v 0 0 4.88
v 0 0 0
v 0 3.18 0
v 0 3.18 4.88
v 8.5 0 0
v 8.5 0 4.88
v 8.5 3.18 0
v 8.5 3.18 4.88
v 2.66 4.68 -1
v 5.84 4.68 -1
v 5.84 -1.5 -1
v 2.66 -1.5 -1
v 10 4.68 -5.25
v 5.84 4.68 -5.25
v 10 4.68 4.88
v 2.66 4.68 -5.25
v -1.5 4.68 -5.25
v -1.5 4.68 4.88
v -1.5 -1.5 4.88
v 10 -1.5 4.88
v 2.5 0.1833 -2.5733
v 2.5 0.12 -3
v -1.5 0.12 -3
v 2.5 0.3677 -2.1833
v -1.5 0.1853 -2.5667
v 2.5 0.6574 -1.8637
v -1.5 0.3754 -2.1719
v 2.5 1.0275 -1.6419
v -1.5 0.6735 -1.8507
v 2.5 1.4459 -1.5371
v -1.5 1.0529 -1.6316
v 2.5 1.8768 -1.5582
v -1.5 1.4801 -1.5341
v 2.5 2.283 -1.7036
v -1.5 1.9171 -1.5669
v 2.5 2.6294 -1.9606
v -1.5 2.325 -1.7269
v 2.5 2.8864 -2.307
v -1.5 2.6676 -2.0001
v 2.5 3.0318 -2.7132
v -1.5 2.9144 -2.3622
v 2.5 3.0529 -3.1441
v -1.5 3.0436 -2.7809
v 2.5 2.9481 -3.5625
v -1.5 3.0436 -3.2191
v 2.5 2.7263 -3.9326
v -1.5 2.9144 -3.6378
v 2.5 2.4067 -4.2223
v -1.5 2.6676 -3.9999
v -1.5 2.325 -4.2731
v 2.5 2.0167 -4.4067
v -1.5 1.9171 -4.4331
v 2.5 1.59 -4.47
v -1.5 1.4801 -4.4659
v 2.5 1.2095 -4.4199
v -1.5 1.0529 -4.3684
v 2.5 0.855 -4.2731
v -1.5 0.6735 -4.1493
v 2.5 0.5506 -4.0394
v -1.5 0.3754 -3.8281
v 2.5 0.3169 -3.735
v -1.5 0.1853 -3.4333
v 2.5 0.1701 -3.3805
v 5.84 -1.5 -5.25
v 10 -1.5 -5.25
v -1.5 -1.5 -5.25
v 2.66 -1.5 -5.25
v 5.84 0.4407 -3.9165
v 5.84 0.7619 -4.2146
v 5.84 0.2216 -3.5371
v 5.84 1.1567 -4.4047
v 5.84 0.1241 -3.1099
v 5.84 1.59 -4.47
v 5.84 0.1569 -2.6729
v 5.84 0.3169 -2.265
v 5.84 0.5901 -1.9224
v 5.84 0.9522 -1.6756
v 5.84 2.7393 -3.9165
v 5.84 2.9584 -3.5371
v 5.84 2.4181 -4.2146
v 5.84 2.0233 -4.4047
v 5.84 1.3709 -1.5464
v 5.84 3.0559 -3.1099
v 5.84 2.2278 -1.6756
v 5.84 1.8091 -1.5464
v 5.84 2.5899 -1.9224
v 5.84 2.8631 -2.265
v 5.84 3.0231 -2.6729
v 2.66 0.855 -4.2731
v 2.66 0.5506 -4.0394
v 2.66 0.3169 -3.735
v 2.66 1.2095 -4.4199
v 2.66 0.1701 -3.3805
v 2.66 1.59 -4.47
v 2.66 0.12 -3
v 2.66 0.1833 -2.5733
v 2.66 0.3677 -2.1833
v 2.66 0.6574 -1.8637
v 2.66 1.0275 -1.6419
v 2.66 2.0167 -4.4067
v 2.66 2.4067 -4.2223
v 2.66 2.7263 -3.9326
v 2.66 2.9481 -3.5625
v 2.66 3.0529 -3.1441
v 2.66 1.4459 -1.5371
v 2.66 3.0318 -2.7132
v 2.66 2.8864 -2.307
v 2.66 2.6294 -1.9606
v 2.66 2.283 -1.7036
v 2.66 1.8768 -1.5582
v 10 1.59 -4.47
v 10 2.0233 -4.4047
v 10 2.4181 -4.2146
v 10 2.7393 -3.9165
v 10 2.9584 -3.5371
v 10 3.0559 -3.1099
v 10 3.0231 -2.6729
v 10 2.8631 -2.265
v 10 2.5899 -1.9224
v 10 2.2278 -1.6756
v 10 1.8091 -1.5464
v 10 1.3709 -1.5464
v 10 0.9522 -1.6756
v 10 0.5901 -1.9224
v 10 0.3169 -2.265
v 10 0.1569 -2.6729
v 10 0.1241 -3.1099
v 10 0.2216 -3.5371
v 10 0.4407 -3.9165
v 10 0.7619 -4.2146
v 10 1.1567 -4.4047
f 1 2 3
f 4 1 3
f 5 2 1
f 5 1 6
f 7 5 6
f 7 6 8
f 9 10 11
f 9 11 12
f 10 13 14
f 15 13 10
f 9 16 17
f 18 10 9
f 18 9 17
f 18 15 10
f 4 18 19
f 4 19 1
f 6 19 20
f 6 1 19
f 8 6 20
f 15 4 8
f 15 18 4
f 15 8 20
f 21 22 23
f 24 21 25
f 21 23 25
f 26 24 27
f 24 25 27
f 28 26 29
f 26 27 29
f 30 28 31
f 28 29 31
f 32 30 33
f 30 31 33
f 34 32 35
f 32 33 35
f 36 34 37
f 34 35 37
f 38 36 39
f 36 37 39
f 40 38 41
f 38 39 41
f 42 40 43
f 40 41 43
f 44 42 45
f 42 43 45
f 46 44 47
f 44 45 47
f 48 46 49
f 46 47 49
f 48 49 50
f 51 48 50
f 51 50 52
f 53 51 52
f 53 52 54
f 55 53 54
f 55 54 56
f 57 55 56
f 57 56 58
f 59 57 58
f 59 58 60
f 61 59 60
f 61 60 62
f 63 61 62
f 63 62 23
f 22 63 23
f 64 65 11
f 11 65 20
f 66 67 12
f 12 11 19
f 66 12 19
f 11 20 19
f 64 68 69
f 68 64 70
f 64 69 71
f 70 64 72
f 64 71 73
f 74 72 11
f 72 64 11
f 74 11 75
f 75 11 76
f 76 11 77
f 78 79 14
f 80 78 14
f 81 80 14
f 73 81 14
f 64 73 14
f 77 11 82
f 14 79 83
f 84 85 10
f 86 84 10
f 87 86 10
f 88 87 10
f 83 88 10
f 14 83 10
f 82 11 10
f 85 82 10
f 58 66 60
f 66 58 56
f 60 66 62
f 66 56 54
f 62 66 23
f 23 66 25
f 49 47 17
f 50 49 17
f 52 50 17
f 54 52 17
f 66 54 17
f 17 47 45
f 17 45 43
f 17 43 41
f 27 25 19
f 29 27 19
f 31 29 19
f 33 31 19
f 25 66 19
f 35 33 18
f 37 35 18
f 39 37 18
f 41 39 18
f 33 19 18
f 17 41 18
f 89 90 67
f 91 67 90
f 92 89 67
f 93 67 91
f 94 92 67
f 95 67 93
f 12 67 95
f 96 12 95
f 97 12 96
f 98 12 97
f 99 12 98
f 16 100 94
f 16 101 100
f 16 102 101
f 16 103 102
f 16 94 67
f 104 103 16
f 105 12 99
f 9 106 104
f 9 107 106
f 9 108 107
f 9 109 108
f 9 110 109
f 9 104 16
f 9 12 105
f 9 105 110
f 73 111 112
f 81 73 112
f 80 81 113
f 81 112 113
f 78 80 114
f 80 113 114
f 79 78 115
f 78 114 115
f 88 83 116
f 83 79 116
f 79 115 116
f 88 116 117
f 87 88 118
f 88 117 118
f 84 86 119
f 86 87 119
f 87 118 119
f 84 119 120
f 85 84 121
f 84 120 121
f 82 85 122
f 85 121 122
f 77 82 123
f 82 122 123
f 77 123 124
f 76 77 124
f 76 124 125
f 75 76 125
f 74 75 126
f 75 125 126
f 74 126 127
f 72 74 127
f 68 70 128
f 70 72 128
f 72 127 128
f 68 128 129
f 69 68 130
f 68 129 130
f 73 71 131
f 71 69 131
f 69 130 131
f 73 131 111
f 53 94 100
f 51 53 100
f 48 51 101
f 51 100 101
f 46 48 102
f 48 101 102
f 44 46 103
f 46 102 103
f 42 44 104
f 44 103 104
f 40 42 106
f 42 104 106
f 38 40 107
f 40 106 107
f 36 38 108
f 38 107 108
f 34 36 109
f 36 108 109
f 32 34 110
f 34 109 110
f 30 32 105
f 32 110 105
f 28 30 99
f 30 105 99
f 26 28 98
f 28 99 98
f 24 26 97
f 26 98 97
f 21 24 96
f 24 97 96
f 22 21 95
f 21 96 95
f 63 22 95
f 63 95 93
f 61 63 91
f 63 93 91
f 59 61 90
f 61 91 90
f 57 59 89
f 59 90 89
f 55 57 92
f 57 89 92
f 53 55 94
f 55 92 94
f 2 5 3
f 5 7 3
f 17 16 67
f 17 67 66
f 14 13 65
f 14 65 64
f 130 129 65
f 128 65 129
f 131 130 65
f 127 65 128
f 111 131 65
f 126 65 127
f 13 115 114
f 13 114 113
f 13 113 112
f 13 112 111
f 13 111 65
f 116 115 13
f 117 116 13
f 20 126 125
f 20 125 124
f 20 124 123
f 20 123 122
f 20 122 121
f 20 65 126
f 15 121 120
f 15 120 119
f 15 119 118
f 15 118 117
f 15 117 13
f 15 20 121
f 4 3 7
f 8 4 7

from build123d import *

# Parameters (mm, degrees)
SKETCH1_W           = 11.5
SKETCH1_H           = 6.18
SKETCH1_W_2         = 8.5
SKETCH1_H_2         = 3.18
BOSS_EXTRUDE1_DEPTH = 4.88
SKETCH2_W           = 11.5
SKETCH2_H           = 6.18
BOSS_EXTRUDE2_DEPTH = 1
SKETCH3_W           = 4.16
SKETCH3_H           = 6.18
BOSS_EXTRUDE3_DEPTH = 4.25
SKETCH4_R           = 1.47
CUT_EXTRUDE1_DEPTH  = 7.5
SKETCH5_R           = 1.47
CUT_EXTRUDE2_DEPTH  = 14.480166913


with BuildPart() as part:
    # Sketch1 → Boss-Extrude1 (new body)
    with BuildSketch(Plane.XY):
        with Locations((4.25, 1.59)):
            Rectangle(SKETCH1_W, SKETCH1_H)
        with Locations((4.25, 1.59)):
            Rectangle(SKETCH1_W_2, SKETCH1_H_2, mode=Mode.SUBTRACT)
    extrude(amount=BOSS_EXTRUDE1_DEPTH)

    # Sketch2 → Boss-Extrude2 (add)
    with BuildSketch(Plane(origin=(0, 0, 0), x_dir=(-1, 0, 0), z_dir=(0, 0, -1))):
        with Locations((-4.25, 1.59)):
            Rectangle(SKETCH2_W, SKETCH2_H)
    extrude(amount=BOSS_EXTRUDE2_DEPTH)

    # Sketch3 → Boss-Extrude3 (add)
    with BuildSketch(Plane(origin=(0, 0, -1), x_dir=(-1, 0, 0), z_dir=(0, 0, -1))):
        with Locations((-7.92, 1.59)):
            Rectangle(SKETCH3_W, SKETCH3_H)
        with Locations((-0.58, 1.59)):
            Rectangle(SKETCH3_W, SKETCH3_H)
    extrude(amount=BOSS_EXTRUDE3_DEPTH)

    # Sketch4 → Cut-Extrude1 (cut)
    with BuildSketch(Plane(origin=(10, 0, 0), x_dir=(0, 0, -1), z_dir=(1, 0, 0))):
        with Locations((3, 1.59)):
            Circle(SKETCH4_R)
    extrude(amount=-CUT_EXTRUDE1_DEPTH, mode=Mode.SUBTRACT)

    # Sketch5 → Cut-Extrude2 (cut, through all)
    with BuildSketch(Plane.ZY.offset(1.5)):
        with Locations(Location((-3, 1.59, 0), (0, 0, 270))):
            Circle(SKETCH5_R)
    extrude(amount=-CUT_EXTRUDE2_DEPTH, mode=Mode.SUBTRACT)


solid = part.part
